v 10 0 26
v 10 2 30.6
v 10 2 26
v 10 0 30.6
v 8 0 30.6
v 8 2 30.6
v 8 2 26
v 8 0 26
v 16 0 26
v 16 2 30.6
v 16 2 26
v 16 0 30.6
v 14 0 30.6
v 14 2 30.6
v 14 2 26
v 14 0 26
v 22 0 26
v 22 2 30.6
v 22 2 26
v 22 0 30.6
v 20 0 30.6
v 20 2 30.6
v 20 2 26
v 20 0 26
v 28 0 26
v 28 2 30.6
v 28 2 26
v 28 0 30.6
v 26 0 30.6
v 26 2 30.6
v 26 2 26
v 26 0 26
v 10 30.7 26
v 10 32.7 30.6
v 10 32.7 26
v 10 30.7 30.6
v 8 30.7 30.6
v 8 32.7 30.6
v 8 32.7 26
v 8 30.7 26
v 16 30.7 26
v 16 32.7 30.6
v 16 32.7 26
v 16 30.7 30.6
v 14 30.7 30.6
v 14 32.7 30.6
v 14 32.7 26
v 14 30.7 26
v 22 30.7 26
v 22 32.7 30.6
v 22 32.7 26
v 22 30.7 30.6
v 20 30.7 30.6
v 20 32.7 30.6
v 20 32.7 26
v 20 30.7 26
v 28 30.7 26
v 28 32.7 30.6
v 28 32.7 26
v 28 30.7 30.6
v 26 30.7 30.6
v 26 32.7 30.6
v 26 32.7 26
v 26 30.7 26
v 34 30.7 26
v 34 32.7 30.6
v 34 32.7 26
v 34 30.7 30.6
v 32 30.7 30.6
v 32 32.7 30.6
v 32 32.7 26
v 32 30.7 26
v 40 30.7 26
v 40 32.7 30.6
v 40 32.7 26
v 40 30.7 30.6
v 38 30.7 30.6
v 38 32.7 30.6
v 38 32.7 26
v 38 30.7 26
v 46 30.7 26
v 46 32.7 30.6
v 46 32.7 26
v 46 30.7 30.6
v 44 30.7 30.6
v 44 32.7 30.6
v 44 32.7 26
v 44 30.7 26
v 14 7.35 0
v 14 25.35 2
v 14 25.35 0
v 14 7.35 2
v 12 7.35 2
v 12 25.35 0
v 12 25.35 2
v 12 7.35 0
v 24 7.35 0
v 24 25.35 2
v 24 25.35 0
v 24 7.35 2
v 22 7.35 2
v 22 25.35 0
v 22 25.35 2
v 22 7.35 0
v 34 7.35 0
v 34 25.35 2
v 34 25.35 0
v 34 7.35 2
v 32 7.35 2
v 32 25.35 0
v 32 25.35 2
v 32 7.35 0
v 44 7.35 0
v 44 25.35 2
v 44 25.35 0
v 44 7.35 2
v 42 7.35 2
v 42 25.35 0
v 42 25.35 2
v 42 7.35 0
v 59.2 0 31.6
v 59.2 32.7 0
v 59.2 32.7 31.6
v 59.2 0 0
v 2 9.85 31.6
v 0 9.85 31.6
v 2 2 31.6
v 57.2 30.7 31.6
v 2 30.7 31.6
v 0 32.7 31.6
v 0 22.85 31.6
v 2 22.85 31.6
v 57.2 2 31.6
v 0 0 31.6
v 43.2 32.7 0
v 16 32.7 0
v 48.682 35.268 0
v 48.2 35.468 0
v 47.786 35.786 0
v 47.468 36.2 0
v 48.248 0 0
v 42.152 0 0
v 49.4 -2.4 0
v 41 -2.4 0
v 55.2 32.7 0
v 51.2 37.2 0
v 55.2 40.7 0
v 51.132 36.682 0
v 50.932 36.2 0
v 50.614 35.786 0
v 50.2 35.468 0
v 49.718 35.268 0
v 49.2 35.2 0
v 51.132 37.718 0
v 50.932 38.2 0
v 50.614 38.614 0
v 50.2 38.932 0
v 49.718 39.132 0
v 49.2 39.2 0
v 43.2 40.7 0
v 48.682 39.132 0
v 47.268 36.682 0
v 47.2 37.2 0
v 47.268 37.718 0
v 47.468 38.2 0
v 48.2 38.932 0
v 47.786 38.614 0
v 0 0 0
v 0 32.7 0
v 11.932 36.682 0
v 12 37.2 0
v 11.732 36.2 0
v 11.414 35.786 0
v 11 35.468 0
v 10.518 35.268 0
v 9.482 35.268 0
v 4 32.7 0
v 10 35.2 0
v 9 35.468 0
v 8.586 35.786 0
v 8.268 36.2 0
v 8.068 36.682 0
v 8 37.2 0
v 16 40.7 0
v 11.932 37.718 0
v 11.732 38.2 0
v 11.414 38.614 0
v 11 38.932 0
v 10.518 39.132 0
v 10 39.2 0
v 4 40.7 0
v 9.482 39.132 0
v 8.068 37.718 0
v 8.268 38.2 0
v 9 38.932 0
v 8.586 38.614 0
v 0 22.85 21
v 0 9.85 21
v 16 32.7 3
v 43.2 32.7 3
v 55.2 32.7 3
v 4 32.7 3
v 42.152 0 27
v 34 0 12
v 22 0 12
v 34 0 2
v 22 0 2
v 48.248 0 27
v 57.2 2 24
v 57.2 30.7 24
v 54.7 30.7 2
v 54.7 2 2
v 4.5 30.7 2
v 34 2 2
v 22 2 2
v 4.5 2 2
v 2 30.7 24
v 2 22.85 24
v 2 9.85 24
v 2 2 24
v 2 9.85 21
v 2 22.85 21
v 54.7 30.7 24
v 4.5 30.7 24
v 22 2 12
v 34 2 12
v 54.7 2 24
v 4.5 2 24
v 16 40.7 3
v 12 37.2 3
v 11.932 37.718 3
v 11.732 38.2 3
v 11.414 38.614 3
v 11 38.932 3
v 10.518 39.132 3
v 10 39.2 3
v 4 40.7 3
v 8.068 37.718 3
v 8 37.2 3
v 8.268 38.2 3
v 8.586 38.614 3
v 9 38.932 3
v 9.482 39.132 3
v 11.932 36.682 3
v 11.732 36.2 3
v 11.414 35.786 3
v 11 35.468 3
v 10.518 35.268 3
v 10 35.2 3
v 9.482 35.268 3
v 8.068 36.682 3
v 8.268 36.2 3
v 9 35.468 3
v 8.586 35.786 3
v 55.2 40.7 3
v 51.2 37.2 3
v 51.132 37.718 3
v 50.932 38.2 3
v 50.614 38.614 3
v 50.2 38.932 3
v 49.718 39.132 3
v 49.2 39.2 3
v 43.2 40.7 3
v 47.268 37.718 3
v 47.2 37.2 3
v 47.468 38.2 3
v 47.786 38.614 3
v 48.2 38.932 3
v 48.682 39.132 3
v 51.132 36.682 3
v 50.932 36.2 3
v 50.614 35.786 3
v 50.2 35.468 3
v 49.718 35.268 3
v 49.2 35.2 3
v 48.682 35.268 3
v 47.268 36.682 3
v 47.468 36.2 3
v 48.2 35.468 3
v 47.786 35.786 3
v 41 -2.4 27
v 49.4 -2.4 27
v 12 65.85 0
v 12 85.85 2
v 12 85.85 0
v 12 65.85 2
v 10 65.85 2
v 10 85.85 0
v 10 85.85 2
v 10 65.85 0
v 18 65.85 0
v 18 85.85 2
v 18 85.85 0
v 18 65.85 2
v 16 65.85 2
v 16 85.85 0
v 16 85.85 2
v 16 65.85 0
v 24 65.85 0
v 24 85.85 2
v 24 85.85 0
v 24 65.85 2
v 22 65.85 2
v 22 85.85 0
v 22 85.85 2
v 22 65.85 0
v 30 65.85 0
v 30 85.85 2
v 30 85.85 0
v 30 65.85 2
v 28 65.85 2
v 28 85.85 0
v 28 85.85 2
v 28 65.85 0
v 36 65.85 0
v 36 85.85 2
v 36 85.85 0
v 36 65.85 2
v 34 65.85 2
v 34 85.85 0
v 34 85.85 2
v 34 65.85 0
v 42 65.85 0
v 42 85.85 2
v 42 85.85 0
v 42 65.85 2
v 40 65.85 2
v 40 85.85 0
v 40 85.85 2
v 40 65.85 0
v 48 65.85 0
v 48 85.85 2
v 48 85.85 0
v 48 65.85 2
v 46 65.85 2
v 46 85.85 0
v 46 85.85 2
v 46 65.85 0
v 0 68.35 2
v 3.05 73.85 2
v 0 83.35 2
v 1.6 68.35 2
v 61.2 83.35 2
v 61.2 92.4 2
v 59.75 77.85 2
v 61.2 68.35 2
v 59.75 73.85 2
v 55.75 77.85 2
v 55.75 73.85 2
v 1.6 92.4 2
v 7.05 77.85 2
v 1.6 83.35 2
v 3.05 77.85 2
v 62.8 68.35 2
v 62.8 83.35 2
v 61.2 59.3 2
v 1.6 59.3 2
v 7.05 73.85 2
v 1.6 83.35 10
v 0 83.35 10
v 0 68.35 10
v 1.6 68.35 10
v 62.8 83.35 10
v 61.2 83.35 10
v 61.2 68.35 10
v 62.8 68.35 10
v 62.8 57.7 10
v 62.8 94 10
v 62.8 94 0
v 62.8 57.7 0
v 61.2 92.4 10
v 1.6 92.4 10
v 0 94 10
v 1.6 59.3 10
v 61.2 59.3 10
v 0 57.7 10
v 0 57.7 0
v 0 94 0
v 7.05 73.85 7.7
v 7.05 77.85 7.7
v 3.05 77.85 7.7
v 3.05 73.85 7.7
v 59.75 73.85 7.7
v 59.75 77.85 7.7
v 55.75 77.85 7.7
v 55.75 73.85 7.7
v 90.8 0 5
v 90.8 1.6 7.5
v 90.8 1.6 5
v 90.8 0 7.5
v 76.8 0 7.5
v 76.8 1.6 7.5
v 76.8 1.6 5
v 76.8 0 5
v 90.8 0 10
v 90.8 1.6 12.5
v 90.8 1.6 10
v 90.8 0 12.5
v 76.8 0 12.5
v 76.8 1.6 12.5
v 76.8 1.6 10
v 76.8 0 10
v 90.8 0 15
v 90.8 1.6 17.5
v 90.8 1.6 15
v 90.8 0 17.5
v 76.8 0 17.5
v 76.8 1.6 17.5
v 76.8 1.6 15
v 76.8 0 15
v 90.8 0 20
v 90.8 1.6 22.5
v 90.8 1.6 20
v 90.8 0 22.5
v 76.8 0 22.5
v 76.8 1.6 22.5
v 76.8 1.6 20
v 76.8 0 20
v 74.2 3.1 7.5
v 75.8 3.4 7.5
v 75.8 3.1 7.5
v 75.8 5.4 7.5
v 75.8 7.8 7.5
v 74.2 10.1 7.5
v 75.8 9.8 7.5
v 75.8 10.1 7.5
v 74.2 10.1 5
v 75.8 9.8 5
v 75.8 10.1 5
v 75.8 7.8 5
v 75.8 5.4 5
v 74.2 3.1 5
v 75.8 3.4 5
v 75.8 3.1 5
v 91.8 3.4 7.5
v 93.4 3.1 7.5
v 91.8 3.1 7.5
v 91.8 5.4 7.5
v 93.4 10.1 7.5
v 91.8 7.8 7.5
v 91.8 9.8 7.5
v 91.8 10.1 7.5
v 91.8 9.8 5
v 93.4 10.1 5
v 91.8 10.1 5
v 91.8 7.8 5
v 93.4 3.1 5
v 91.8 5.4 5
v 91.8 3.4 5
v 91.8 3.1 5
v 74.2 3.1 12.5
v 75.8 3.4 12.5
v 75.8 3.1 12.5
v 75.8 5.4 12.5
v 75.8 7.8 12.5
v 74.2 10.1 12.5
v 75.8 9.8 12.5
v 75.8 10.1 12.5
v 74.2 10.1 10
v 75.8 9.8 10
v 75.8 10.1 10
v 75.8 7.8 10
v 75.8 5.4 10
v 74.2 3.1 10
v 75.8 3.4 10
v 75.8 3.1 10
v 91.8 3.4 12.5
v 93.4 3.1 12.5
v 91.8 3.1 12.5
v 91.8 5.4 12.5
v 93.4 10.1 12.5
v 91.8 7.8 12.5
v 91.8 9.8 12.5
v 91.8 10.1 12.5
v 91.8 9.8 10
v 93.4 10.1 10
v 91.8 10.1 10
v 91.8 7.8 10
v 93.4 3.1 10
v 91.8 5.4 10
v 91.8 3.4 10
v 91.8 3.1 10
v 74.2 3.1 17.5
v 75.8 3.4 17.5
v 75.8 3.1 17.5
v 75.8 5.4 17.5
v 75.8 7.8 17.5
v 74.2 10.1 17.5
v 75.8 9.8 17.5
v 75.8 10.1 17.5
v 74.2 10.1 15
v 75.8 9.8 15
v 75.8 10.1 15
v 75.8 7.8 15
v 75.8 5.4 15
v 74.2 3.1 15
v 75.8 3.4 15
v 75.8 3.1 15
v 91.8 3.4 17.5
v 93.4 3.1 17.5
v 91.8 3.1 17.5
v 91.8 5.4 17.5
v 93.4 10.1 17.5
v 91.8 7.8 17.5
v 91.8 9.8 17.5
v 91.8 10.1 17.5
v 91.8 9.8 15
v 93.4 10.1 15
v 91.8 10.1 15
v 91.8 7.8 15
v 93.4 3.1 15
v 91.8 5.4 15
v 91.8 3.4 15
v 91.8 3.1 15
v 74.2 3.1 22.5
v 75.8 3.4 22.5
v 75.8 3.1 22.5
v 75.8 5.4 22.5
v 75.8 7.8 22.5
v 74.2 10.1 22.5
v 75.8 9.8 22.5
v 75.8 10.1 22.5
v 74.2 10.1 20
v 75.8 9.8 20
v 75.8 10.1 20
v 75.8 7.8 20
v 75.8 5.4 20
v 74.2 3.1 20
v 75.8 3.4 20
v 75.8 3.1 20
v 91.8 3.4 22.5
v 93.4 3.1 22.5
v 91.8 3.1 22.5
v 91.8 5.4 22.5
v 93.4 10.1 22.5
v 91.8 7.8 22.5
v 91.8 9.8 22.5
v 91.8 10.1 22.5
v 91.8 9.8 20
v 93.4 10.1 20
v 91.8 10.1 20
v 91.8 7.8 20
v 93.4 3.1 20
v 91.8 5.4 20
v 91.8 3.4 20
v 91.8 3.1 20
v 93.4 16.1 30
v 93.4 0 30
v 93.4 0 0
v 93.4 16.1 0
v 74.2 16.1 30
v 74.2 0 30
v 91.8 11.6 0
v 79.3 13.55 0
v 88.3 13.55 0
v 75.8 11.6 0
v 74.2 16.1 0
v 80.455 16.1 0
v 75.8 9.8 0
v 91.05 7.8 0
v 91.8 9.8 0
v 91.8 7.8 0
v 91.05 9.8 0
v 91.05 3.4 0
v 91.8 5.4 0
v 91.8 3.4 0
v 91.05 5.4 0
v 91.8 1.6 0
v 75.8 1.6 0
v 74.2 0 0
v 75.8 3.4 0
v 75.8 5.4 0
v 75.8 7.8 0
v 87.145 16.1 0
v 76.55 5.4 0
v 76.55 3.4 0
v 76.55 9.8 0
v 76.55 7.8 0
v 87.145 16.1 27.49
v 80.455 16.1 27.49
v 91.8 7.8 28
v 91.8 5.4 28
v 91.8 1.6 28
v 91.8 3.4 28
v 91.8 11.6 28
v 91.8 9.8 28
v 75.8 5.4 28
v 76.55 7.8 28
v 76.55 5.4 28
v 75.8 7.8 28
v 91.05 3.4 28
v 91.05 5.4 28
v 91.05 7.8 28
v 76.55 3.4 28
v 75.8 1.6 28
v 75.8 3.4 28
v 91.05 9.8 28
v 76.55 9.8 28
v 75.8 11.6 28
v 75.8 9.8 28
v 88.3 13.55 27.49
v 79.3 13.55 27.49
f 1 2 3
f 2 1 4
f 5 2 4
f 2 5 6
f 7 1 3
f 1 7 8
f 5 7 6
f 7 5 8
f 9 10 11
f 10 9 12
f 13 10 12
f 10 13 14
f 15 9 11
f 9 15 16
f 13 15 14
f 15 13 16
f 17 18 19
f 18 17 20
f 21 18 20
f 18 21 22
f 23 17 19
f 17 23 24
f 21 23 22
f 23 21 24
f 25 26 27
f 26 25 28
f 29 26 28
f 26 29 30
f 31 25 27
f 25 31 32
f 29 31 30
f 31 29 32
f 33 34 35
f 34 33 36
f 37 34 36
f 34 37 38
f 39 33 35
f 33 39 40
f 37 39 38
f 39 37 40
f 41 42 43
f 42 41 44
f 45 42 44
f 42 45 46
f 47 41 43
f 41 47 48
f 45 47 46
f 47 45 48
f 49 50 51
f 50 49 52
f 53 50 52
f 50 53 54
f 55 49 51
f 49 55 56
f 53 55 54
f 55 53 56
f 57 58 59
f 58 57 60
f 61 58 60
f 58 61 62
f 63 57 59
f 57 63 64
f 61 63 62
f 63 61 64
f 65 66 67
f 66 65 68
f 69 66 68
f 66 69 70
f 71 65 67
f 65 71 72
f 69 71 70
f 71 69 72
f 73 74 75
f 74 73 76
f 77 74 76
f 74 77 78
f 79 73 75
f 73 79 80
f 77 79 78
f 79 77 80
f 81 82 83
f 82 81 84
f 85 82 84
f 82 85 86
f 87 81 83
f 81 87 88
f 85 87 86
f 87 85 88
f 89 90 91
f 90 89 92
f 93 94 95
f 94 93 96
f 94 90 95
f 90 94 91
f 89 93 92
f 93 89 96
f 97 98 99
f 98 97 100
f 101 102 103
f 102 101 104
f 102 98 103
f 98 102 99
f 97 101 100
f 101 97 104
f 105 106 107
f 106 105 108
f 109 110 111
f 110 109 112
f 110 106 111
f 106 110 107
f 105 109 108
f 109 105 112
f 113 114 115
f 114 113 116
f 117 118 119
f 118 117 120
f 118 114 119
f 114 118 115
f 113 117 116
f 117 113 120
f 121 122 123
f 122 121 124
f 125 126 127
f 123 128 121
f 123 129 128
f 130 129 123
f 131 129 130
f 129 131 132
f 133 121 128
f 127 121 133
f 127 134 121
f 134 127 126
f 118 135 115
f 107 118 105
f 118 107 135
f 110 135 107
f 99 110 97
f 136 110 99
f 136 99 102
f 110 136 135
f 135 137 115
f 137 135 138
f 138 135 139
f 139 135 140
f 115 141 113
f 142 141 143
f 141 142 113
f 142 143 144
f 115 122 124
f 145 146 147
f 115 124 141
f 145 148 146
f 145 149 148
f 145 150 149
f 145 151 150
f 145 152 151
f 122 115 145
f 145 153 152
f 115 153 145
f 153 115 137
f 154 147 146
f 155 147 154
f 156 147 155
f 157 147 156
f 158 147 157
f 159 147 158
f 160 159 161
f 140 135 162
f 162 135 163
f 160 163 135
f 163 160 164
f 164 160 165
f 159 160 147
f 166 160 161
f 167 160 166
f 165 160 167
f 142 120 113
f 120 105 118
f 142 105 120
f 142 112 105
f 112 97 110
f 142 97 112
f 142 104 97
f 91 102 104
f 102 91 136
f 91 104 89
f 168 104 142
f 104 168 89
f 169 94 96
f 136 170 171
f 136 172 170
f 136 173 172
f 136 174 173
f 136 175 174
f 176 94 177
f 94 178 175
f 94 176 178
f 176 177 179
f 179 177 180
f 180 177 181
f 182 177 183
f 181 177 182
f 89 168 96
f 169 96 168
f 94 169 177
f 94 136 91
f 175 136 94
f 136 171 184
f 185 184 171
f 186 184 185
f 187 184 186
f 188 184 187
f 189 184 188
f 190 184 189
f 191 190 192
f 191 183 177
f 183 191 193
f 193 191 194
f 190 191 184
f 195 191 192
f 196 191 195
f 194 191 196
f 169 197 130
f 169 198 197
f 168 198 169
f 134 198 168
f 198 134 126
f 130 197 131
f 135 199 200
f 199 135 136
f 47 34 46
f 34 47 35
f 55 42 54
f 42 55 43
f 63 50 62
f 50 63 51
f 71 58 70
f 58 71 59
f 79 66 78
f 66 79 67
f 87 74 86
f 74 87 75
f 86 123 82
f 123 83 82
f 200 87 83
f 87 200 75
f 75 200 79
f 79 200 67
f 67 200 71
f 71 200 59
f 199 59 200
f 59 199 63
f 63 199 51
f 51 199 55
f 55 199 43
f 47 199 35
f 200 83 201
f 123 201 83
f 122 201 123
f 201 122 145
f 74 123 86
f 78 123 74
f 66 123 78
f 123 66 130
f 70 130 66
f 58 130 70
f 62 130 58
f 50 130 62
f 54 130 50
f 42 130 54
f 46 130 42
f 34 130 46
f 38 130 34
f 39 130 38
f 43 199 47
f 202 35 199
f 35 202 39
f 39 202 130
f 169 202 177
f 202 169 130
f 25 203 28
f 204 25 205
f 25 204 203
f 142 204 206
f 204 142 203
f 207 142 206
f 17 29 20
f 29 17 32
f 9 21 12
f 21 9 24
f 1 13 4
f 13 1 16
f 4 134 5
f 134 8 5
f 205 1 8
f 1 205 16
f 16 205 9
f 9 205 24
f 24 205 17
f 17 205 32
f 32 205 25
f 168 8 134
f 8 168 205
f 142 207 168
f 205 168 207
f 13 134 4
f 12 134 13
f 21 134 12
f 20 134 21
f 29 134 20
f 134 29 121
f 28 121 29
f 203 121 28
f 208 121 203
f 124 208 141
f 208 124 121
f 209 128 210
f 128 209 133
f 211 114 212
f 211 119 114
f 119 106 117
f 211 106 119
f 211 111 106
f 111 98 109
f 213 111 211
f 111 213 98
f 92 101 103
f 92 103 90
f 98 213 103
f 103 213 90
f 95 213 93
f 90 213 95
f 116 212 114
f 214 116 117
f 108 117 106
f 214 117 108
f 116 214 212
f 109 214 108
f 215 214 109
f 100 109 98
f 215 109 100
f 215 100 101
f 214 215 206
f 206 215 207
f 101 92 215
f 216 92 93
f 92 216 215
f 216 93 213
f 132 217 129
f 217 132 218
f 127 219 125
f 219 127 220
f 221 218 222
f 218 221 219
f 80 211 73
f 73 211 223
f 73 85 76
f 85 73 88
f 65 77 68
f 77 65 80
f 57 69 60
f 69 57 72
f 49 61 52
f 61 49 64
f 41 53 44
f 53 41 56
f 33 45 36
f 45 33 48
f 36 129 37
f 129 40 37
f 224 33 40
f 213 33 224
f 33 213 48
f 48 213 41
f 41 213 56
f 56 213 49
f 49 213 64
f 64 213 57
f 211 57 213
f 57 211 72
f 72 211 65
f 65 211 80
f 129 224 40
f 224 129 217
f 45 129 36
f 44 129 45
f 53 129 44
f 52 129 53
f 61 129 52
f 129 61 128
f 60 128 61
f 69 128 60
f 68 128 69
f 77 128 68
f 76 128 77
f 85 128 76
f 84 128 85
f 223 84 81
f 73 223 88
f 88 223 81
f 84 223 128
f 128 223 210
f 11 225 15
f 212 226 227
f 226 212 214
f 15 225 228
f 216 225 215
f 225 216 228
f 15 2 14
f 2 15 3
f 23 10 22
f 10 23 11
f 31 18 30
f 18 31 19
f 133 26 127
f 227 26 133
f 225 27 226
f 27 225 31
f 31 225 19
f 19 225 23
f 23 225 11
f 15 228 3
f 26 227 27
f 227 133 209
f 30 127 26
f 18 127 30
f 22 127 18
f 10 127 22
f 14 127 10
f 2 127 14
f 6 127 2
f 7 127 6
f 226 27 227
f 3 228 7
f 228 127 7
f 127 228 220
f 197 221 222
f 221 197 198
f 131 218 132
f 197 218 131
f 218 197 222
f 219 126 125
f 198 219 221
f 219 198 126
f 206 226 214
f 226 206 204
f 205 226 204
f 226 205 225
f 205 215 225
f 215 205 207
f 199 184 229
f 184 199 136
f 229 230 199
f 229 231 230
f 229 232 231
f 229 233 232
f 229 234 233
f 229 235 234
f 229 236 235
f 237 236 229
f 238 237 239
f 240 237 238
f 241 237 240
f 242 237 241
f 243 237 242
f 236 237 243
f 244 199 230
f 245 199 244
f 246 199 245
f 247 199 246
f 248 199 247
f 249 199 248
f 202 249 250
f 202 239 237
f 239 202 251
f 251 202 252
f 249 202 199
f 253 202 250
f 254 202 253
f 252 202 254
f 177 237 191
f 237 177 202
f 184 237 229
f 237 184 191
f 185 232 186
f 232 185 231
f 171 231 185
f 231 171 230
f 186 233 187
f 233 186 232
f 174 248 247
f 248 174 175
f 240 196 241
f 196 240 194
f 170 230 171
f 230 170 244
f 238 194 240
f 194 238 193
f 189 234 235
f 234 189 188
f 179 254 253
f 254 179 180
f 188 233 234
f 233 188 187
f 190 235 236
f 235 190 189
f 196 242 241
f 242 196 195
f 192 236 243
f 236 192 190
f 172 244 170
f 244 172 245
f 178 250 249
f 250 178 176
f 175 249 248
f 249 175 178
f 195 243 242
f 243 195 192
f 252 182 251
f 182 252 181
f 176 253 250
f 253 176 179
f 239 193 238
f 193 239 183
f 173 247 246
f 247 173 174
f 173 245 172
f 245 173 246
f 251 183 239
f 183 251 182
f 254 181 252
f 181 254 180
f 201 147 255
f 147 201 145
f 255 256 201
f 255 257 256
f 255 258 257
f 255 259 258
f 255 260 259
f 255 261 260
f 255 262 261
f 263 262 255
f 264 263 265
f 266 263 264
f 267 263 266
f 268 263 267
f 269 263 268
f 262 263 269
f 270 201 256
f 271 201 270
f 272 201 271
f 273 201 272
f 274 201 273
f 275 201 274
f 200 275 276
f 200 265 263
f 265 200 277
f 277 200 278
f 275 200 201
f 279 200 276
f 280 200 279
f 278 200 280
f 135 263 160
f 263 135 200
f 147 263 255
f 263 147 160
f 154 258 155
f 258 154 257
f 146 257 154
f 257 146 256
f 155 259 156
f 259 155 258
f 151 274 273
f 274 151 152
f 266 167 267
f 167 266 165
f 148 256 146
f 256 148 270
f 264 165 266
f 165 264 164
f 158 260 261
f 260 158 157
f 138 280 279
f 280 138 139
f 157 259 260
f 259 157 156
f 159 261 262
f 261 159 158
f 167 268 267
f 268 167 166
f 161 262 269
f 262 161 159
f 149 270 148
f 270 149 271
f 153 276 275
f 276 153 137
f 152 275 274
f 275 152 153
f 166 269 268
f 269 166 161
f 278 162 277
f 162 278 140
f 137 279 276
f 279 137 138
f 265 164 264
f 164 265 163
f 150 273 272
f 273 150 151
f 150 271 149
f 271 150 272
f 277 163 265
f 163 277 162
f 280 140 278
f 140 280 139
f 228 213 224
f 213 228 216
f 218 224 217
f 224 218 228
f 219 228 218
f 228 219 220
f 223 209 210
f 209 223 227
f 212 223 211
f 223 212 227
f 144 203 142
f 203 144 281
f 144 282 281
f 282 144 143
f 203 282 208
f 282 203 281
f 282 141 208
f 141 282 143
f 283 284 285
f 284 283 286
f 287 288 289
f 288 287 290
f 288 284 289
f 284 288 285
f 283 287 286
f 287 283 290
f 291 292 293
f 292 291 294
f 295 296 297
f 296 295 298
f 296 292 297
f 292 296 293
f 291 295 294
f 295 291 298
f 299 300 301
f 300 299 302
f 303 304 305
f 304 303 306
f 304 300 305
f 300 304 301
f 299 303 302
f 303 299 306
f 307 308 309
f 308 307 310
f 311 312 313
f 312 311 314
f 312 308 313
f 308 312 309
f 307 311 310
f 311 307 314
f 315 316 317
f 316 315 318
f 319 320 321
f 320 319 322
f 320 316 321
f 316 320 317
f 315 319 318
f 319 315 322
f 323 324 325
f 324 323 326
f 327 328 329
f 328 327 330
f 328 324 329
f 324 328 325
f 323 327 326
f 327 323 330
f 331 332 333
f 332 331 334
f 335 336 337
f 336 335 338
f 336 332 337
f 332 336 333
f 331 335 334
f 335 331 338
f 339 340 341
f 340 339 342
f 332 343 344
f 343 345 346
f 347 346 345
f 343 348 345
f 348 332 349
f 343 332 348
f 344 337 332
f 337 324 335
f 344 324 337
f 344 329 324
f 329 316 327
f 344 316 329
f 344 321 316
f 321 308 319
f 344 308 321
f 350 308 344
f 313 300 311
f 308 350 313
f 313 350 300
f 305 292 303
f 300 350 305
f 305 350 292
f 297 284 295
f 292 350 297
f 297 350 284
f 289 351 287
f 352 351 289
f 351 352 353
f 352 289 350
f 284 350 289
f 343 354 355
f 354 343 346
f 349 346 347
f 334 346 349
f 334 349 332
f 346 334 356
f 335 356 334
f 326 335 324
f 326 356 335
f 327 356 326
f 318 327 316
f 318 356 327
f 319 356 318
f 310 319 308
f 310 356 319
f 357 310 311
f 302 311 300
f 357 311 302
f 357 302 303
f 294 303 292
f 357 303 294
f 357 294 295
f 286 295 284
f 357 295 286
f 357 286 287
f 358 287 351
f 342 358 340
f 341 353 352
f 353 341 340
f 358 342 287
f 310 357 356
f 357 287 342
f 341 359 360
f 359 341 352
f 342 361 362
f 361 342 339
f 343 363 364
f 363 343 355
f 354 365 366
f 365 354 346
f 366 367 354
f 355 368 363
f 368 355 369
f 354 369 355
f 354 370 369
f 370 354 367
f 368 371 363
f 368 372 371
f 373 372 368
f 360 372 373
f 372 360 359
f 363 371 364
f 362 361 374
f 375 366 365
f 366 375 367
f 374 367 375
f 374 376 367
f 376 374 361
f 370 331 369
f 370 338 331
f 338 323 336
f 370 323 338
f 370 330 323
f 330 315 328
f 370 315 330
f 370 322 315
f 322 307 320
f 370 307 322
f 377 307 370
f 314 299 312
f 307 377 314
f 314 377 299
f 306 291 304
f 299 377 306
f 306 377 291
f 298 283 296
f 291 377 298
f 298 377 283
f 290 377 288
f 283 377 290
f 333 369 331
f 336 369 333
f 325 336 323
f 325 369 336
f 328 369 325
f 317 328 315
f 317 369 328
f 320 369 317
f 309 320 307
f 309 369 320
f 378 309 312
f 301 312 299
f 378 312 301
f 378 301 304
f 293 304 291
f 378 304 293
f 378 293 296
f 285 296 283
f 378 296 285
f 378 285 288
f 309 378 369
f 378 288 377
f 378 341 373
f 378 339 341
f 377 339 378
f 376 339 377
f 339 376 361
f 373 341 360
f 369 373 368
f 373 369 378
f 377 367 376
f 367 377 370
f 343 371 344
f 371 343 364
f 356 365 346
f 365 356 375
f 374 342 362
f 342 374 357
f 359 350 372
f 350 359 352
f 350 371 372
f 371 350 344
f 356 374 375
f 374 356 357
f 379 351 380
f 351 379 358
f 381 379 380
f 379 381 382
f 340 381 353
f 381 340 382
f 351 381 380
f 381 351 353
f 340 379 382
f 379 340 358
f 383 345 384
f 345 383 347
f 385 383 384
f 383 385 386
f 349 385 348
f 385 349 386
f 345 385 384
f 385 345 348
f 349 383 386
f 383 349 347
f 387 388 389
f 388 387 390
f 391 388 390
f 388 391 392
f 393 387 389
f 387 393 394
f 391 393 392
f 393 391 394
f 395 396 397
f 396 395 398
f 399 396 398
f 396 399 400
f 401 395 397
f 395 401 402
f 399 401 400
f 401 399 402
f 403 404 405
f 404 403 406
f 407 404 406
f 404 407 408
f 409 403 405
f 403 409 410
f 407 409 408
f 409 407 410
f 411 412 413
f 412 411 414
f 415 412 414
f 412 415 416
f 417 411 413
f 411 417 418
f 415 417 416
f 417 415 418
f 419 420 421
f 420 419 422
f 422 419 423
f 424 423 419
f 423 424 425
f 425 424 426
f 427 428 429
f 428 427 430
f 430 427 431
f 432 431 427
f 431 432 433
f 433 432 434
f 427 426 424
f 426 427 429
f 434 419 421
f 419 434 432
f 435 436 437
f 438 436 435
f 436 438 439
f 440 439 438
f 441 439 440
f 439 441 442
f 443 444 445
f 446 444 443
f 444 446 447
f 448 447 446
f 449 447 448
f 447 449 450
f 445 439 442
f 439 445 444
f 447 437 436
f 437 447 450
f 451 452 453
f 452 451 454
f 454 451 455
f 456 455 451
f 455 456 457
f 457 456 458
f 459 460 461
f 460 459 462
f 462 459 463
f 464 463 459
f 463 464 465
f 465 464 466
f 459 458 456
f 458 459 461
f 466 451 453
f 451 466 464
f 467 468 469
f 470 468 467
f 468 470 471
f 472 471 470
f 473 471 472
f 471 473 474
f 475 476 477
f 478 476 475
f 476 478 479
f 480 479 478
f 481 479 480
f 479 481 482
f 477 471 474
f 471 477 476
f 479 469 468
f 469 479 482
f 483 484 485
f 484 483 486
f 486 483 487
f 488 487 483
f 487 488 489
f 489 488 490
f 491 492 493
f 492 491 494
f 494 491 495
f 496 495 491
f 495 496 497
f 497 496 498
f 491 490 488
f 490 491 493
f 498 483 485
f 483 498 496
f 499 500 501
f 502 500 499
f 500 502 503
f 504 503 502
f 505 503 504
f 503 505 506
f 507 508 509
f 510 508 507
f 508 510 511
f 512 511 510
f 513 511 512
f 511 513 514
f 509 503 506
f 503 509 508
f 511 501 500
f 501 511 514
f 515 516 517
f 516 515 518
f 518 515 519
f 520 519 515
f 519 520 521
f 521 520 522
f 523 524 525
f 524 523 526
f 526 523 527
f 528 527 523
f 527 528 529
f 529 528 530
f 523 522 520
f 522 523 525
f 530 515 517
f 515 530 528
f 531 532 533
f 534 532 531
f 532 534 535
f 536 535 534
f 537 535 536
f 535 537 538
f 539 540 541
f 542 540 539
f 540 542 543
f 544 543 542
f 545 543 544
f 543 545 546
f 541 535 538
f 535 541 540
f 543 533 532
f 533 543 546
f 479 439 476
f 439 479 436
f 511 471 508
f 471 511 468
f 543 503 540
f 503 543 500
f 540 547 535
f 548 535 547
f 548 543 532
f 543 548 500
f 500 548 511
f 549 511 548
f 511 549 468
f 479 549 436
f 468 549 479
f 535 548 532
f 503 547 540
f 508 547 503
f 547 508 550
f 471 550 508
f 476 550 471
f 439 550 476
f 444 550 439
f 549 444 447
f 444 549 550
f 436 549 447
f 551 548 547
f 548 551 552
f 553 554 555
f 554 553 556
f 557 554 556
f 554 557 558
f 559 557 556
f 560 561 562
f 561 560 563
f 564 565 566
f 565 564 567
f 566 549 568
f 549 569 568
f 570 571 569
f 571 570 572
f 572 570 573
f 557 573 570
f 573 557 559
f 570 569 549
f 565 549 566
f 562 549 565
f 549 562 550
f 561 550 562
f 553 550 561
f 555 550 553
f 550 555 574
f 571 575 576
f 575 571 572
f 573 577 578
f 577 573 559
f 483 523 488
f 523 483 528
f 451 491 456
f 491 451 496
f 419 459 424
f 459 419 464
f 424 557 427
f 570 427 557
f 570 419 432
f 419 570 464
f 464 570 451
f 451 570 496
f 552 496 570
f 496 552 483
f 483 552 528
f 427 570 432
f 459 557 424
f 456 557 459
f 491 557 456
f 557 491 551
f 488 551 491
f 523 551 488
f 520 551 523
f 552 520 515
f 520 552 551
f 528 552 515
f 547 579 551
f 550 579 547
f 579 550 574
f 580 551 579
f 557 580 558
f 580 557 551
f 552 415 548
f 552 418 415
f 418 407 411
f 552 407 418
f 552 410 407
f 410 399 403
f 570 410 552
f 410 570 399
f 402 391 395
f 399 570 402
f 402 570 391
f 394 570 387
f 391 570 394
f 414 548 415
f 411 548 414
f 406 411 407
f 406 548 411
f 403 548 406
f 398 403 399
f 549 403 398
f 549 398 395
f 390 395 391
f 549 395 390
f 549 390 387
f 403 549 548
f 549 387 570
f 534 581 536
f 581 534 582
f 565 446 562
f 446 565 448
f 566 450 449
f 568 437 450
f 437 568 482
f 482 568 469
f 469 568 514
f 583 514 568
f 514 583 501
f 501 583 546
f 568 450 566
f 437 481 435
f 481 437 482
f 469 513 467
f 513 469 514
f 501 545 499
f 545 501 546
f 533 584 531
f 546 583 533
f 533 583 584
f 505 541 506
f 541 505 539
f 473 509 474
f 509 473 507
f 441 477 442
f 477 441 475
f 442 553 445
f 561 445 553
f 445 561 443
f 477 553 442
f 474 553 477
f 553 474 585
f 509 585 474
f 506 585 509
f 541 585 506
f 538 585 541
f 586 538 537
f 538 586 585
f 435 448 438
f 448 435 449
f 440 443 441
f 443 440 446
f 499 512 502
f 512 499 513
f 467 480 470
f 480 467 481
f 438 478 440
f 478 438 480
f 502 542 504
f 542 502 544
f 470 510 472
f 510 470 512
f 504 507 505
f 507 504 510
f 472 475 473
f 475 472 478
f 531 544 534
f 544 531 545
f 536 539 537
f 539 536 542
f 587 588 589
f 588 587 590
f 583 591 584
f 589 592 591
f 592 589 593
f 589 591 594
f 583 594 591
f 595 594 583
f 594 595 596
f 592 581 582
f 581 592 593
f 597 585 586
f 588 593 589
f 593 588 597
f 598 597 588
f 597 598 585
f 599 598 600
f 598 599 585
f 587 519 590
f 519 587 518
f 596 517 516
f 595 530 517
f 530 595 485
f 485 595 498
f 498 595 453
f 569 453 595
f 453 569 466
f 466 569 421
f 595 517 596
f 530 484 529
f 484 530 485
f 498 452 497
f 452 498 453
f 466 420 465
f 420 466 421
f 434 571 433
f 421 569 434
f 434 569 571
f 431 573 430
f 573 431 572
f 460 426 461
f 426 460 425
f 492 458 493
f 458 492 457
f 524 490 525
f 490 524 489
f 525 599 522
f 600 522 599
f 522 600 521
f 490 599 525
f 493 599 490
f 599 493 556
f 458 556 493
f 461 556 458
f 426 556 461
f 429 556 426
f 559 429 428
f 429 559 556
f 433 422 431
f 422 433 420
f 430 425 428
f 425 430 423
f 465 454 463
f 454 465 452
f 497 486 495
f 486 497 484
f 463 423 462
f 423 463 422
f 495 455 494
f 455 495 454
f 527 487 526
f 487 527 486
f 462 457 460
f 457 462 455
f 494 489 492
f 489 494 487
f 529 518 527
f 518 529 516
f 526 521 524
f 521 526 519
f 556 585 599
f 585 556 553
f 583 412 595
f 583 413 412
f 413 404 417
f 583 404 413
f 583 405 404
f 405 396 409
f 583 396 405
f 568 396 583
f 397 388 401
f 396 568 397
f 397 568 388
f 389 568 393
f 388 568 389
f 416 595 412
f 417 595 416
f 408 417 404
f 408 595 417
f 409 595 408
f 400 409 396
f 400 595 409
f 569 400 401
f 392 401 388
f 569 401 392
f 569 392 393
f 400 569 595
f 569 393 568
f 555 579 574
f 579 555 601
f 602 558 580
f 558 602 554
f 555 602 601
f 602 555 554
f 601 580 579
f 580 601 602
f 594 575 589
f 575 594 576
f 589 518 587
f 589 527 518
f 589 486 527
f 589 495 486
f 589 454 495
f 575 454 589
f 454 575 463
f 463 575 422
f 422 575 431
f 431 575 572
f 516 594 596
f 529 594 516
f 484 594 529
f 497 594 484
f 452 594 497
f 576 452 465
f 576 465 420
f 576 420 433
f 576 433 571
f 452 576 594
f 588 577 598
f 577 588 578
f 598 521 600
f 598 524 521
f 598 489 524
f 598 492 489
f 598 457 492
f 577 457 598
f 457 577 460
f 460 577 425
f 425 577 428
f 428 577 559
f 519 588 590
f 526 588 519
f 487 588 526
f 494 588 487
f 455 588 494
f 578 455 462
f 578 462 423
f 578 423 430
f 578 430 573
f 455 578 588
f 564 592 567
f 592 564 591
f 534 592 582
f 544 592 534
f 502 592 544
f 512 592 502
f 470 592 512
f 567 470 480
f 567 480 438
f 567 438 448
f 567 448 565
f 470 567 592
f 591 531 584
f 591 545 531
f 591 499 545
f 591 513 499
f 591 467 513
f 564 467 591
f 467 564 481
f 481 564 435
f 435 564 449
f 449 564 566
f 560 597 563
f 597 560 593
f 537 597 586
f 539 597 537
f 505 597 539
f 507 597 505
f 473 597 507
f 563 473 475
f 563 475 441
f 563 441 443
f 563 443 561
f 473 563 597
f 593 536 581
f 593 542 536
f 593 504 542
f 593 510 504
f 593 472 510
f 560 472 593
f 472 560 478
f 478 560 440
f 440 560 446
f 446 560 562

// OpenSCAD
// =====================================================================
// 教室の温度ムラ「見える化」プロジェクト — ノードケース
//
// 収納するもの:
//   - ESP32-DevKitC-32E（秋月 115673）… 本体ボックスに収納
//   - AE-SHT31 温湿度センサー（秋月 112125）… 横づけの通風ポッドに収納
//   - 両者はメスメスのジャンパー線4本（3V3/GND/SDA21/SCL22）で接続
//
// 設計方針:
//   ESP32は自己発熱する（無線送信＋レギュレータ）ため、センサーを
//   同じ箱に入れると温度が高めにずれる。そこでセンサーは本体の外側に
//   ルーバー（通風スリット）付きの小さなポッドとして分離し、
//   アリ溝（ダブテール）で本体側面にスライド装着する。
//
// 印刷: Bambu Lab A1 mini / PLA / 0.2mm層 / サポート不要
//   body … そのままの向き（開口部を上）
//   lid  … 天板を下（このファイルの出力そのままの向き）
//   pod  … そのままの向き（開口部を下＝造形の底）
//
// 使い方:
//   下の part を切り替えて1パーツずつSTLに書き出す。
//   コマンドライン例:
//     openscad -D 'part="body"' -o stl/node_case_body.stl node_case.scad
// =====================================================================

part = "all"; // "body" / "lid" / "pod" / "all"（all は配置プレビュー用）

// ---------------------------------------------------------------
// ★ 印刷前にノギスで実測して合わせるパラメータ ★
// ---------------------------------------------------------------
esp_l = 54.4;  // ESP32-DevKitC-32E 基板の長さ
esp_w = 27.9;  // 同 幅
esp_t = 1.6;   // 同 板厚

sht_w = 14.0;  // AE-SHT31 基板の幅（溝にくわえさせる方向。要実測！）
sht_t = 1.2;   // 同 板厚（部品高さぶんの余裕は別途 gap で確保）

tol     = 0.4; // 基板まわりの遊び（片側）。きつい/ゆるい時はここを調整
lid_tol = 0.2; // フタのはめあい。きつければ0.3に
dove_tol= 0.3; // アリ溝のはめあい

// ---------------------------------------------------------------
// 本体ボックスの寸法
// ---------------------------------------------------------------
wall    = 2.0;  // 壁厚
floor_t = 2.0;  // 底厚
bay_h   = 22;   // 基板下の空間（ピン＋ジャンパーコネクタ14mm＋曲げ余裕）
top_h   = 6;    // 基板上の空間（部品高さ＋余裕）

cav_l  = esp_l + 2*tol;
cav_w  = esp_w + 2*tol;
body_l = cav_l + 2*wall;             // ≈59.2
body_w = cav_w + 2*wall;             // ≈32.7
body_h = floor_t + bay_h + esp_t + top_h;  // ≈31.6

ledge_d = 2.5;  // 基板を支える棚（短辺側。ピンの無い端3mm以内に収める）

usb_w   = 13;   // micro-USBプラグの逃がし幅（モールド部が通る幅）
wire_hole_w = 12; // センサー行きジャンパー4本の出口
wire_hole_h = 10;

// アリ溝レール（本体側がオス）
rail_cx   = body_l - 14; // レール中心のX位置（アンテナ側の端寄り）
rail_h    = 27;          // レールの高さ
rail_root = 6;           // 根元幅
rail_tip  = 8.4;         // 先端幅
rail_d    = 2.4;         // 突出量

// ---------------------------------------------------------------
// フタ（かぶせ式キャップ）
// ---------------------------------------------------------------
lid_wall = 1.6;
lid_top  = 2.0;
skirt    = 8.0;   // スカート（側面に下りる部分）の高さ
post     = 4.0;   // 基板おさえポストの太さ
post_gap = 0.3;   // ポスト先端と基板の隙間（押し付けすぎない）

lid_l = body_l + 2*(lid_tol + lid_wall);
lid_w = body_w + 2*(lid_tol + lid_wall);
post_h = top_h - post_gap;

// ---------------------------------------------------------------
// センサーポッド
// ---------------------------------------------------------------
p_wall  = 1.6;
p_back  = 4.5;            // アリ溝側の厚壁
pw_in   = sht_w + 2.0;    // 内寸X（基板幅＋余裕）
pd_in   = 10;             // 内寸Y
p_h     = 30;             // 全高（底は全開放）
p_top   = 2.0;            // 天板厚
rib_d   = (pw_in - (sht_w + 0.5)) / 2; // リブ突出量 → 溝スパン=基板幅+0.5
rib_gap = sht_t + 1.2;    // 基板をくわえる溝の幅（部品ぶんの余裕込み）

pod_x = pw_in + 2*p_wall;
pod_y = pd_in + p_wall + p_back;

// =====================================================================
eps = 0.01;

// ---- 本体 ----------------------------------------------------------
module body() {
    difference() {
        cube([body_l, body_w, body_h]);

        // 内側の空洞（上面開口）
        translate([wall, wall, floor_t])
            cube([cav_l, cav_w, body_h]);

        // micro-USBの切り欠き（x=0の短辺壁、上まで開いたU字ノッチ）
        translate([-eps, body_w/2 - usb_w/2, floor_t + bay_h - 3])
            cube([wall + 2*eps, usb_w, body_h]);

        // センサー行きジャンパー線の出口（y=0の長辺壁、底面レベル）
        // ポッド（幅pod_x）がレール中心に来ても塞がれない位置に置く
        translate([rail_cx - (pw_in + 2*p_wall)/2 - 1.6 - wire_hole_w, -eps, floor_t])
            cube([wire_hole_w, wall + 2*eps, wire_hole_h]);

        // 通気スリット（両長辺壁の上段＝部品まわりの熱を逃がす）
        for (x = [8, 14, 20, 26])
            translate([x, -eps, floor_t + bay_h + 2])
                cube([2, wall + 2*eps, esp_t + top_h - 3]);
        for (x = [8, 14, 20, 26, 32, 38, 44])
            translate([x, body_w - wall - eps, floor_t + bay_h + 2])
                cube([2, wall + 2*eps, esp_t + top_h - 3]);

        // 底面の通気スリット（下から吸気→上へ抜ける）
        for (x = [12, 22, 32, 42])
            translate([x, body_w/2 - 9, -eps])
                cube([2, 18, floor_t + 2*eps]);
    }

    // 基板を支える棚（両短辺。ピンヘッダの無い端部で受ける）
    translate([wall, wall, floor_t])
        cube([ledge_d, cav_w, bay_h]);
    translate([body_l - wall - ledge_d, wall, floor_t])
        cube([ledge_d, cav_w, bay_h]);

    // アリ溝レール（オス、y=0外壁から-y方向へ突出する縦レール）
    // 断面はXY平面の台形（根元6mm→先端8.4mm）をZ方向に押し出す
    translate([rail_cx, 0, 0])
        linear_extrude(rail_h)
            polygon([[-rail_root/2, 0.1], [rail_root/2, 0.1],
                     [rail_tip/2, -rail_d], [-rail_tip/2, -rail_d]]);

    // 取付け耳（反対側の長辺、ネジ・結束バンド・画鋲なんでも用）
    for (x = [4, body_l - 16])
        translate([x, body_w - 0.1, 0])   // 0.1mm壁に食い込ませて一体化する
            difference() {
                cube([12, 8.1, 3]);
                translate([6, 4.6, -eps]) cylinder(h = 3 + 2*eps, d = 4, $fn = 24);
            }
}

// ---- フタ（印刷向き＝天板が下）--------------------------------------
module lid() {
    difference() {
        cube([lid_l, lid_w, lid_top + skirt]);

        // スカート内側（本体外形＋はめあい遊び）
        translate([lid_wall, lid_wall, lid_top])
            cube([lid_l - 2*lid_wall, lid_w - 2*lid_wall, skirt + eps]);

        // 天板の通気スリット
        for (x = [10, 16, 22, 28, 34, 40, 46])
            translate([x, lid_w/2 - 10, -eps])
                cube([2, 20, lid_top + 2*eps]);

        // 両短辺スカートの切り欠き（USBの逃がし兼、フタを外す指がかり）
        for (sx = [-eps, lid_l - lid_wall - eps])
            translate([sx, lid_w/2 - (usb_w + 2)/2, lid_top])
                cube([lid_wall + 2*eps, usb_w + 2, skirt + 2*eps]);
    }

    // 基板おさえポスト（棚の真上に軽く効かせる）
    off = lid_wall + lid_tol;   // 本体座標→フタ座標のオフセット
    for (bx = [wall + ledge_d/2, body_l - wall - ledge_d/2])
        translate([off + bx - post/2, off + body_w/2 - post/2, lid_top])
            cube([post, post, post_h]);
}

// ---- センサーポッド --------------------------------------------------
module pod() {
    difference() {
        cube([pod_x, pod_y, p_h]);

        // 空洞（底面は全開放＝空気の入口＋配線の通り道）
        translate([p_wall, p_wall, -eps])
            cube([pw_in, pd_in, p_h - p_top + eps]);

        // ルーバー（前面）
        for (z = [5, 10, 15, 20])
            translate([p_wall + 1, -eps, z])
                cube([pw_in - 2, p_wall + 2*eps, 2.5]);

        // ルーバー（両側面）
        for (z = [5, 10, 15, 20], sx = [-eps, pod_x - p_wall - eps])
            translate([sx, p_wall + 1.5, z])
                cube([p_wall + 2*eps, pd_in - 3, 2.5]);

        // アリ溝（メス、背面の厚壁 y=pod_y の面から内側へ。
        // 下から差し込み、溝の上端がレール上端に乗って止まる）
        translate([pod_x/2, pod_y, -eps])
            linear_extrude(rail_h + 0.5)
                polygon([[-rail_root/2 - dove_tol, 0.1],
                         [ rail_root/2 + dove_tol, 0.1],
                         [ rail_tip/2 + dove_tol, -(rail_d + 0.15)],
                         [-rail_tip/2 - dove_tol, -(rail_d + 0.15)]]);
    }

    // 基板をくわえる縦リブ（左右の内壁に2本ずつ→溝を形成。下から挿入）
    rib_y0 = p_wall + pd_in/2 - rib_gap/2 - 2;  // 手前側リブ
    rib_y1 = p_wall + pd_in/2 + rib_gap/2;      // 奥側リブ
    for (sx = [p_wall, pod_x - p_wall - rib_d], ry = [rib_y0, rib_y1])
        translate([sx == p_wall ? p_wall : pod_x - p_wall - rib_d, ry, 0])
            cube([rib_d, 2, p_h - p_top]);
}

// ---- 出力 -----------------------------------------------------------
if (part == "body") body();
if (part == "lid")  lid();
if (part == "pod")  pod();
if (part == "all") {
    body();
    translate([0, body_w + 25, 0]) lid();
    translate([body_l + 15, 0, 0]) pod();
}
